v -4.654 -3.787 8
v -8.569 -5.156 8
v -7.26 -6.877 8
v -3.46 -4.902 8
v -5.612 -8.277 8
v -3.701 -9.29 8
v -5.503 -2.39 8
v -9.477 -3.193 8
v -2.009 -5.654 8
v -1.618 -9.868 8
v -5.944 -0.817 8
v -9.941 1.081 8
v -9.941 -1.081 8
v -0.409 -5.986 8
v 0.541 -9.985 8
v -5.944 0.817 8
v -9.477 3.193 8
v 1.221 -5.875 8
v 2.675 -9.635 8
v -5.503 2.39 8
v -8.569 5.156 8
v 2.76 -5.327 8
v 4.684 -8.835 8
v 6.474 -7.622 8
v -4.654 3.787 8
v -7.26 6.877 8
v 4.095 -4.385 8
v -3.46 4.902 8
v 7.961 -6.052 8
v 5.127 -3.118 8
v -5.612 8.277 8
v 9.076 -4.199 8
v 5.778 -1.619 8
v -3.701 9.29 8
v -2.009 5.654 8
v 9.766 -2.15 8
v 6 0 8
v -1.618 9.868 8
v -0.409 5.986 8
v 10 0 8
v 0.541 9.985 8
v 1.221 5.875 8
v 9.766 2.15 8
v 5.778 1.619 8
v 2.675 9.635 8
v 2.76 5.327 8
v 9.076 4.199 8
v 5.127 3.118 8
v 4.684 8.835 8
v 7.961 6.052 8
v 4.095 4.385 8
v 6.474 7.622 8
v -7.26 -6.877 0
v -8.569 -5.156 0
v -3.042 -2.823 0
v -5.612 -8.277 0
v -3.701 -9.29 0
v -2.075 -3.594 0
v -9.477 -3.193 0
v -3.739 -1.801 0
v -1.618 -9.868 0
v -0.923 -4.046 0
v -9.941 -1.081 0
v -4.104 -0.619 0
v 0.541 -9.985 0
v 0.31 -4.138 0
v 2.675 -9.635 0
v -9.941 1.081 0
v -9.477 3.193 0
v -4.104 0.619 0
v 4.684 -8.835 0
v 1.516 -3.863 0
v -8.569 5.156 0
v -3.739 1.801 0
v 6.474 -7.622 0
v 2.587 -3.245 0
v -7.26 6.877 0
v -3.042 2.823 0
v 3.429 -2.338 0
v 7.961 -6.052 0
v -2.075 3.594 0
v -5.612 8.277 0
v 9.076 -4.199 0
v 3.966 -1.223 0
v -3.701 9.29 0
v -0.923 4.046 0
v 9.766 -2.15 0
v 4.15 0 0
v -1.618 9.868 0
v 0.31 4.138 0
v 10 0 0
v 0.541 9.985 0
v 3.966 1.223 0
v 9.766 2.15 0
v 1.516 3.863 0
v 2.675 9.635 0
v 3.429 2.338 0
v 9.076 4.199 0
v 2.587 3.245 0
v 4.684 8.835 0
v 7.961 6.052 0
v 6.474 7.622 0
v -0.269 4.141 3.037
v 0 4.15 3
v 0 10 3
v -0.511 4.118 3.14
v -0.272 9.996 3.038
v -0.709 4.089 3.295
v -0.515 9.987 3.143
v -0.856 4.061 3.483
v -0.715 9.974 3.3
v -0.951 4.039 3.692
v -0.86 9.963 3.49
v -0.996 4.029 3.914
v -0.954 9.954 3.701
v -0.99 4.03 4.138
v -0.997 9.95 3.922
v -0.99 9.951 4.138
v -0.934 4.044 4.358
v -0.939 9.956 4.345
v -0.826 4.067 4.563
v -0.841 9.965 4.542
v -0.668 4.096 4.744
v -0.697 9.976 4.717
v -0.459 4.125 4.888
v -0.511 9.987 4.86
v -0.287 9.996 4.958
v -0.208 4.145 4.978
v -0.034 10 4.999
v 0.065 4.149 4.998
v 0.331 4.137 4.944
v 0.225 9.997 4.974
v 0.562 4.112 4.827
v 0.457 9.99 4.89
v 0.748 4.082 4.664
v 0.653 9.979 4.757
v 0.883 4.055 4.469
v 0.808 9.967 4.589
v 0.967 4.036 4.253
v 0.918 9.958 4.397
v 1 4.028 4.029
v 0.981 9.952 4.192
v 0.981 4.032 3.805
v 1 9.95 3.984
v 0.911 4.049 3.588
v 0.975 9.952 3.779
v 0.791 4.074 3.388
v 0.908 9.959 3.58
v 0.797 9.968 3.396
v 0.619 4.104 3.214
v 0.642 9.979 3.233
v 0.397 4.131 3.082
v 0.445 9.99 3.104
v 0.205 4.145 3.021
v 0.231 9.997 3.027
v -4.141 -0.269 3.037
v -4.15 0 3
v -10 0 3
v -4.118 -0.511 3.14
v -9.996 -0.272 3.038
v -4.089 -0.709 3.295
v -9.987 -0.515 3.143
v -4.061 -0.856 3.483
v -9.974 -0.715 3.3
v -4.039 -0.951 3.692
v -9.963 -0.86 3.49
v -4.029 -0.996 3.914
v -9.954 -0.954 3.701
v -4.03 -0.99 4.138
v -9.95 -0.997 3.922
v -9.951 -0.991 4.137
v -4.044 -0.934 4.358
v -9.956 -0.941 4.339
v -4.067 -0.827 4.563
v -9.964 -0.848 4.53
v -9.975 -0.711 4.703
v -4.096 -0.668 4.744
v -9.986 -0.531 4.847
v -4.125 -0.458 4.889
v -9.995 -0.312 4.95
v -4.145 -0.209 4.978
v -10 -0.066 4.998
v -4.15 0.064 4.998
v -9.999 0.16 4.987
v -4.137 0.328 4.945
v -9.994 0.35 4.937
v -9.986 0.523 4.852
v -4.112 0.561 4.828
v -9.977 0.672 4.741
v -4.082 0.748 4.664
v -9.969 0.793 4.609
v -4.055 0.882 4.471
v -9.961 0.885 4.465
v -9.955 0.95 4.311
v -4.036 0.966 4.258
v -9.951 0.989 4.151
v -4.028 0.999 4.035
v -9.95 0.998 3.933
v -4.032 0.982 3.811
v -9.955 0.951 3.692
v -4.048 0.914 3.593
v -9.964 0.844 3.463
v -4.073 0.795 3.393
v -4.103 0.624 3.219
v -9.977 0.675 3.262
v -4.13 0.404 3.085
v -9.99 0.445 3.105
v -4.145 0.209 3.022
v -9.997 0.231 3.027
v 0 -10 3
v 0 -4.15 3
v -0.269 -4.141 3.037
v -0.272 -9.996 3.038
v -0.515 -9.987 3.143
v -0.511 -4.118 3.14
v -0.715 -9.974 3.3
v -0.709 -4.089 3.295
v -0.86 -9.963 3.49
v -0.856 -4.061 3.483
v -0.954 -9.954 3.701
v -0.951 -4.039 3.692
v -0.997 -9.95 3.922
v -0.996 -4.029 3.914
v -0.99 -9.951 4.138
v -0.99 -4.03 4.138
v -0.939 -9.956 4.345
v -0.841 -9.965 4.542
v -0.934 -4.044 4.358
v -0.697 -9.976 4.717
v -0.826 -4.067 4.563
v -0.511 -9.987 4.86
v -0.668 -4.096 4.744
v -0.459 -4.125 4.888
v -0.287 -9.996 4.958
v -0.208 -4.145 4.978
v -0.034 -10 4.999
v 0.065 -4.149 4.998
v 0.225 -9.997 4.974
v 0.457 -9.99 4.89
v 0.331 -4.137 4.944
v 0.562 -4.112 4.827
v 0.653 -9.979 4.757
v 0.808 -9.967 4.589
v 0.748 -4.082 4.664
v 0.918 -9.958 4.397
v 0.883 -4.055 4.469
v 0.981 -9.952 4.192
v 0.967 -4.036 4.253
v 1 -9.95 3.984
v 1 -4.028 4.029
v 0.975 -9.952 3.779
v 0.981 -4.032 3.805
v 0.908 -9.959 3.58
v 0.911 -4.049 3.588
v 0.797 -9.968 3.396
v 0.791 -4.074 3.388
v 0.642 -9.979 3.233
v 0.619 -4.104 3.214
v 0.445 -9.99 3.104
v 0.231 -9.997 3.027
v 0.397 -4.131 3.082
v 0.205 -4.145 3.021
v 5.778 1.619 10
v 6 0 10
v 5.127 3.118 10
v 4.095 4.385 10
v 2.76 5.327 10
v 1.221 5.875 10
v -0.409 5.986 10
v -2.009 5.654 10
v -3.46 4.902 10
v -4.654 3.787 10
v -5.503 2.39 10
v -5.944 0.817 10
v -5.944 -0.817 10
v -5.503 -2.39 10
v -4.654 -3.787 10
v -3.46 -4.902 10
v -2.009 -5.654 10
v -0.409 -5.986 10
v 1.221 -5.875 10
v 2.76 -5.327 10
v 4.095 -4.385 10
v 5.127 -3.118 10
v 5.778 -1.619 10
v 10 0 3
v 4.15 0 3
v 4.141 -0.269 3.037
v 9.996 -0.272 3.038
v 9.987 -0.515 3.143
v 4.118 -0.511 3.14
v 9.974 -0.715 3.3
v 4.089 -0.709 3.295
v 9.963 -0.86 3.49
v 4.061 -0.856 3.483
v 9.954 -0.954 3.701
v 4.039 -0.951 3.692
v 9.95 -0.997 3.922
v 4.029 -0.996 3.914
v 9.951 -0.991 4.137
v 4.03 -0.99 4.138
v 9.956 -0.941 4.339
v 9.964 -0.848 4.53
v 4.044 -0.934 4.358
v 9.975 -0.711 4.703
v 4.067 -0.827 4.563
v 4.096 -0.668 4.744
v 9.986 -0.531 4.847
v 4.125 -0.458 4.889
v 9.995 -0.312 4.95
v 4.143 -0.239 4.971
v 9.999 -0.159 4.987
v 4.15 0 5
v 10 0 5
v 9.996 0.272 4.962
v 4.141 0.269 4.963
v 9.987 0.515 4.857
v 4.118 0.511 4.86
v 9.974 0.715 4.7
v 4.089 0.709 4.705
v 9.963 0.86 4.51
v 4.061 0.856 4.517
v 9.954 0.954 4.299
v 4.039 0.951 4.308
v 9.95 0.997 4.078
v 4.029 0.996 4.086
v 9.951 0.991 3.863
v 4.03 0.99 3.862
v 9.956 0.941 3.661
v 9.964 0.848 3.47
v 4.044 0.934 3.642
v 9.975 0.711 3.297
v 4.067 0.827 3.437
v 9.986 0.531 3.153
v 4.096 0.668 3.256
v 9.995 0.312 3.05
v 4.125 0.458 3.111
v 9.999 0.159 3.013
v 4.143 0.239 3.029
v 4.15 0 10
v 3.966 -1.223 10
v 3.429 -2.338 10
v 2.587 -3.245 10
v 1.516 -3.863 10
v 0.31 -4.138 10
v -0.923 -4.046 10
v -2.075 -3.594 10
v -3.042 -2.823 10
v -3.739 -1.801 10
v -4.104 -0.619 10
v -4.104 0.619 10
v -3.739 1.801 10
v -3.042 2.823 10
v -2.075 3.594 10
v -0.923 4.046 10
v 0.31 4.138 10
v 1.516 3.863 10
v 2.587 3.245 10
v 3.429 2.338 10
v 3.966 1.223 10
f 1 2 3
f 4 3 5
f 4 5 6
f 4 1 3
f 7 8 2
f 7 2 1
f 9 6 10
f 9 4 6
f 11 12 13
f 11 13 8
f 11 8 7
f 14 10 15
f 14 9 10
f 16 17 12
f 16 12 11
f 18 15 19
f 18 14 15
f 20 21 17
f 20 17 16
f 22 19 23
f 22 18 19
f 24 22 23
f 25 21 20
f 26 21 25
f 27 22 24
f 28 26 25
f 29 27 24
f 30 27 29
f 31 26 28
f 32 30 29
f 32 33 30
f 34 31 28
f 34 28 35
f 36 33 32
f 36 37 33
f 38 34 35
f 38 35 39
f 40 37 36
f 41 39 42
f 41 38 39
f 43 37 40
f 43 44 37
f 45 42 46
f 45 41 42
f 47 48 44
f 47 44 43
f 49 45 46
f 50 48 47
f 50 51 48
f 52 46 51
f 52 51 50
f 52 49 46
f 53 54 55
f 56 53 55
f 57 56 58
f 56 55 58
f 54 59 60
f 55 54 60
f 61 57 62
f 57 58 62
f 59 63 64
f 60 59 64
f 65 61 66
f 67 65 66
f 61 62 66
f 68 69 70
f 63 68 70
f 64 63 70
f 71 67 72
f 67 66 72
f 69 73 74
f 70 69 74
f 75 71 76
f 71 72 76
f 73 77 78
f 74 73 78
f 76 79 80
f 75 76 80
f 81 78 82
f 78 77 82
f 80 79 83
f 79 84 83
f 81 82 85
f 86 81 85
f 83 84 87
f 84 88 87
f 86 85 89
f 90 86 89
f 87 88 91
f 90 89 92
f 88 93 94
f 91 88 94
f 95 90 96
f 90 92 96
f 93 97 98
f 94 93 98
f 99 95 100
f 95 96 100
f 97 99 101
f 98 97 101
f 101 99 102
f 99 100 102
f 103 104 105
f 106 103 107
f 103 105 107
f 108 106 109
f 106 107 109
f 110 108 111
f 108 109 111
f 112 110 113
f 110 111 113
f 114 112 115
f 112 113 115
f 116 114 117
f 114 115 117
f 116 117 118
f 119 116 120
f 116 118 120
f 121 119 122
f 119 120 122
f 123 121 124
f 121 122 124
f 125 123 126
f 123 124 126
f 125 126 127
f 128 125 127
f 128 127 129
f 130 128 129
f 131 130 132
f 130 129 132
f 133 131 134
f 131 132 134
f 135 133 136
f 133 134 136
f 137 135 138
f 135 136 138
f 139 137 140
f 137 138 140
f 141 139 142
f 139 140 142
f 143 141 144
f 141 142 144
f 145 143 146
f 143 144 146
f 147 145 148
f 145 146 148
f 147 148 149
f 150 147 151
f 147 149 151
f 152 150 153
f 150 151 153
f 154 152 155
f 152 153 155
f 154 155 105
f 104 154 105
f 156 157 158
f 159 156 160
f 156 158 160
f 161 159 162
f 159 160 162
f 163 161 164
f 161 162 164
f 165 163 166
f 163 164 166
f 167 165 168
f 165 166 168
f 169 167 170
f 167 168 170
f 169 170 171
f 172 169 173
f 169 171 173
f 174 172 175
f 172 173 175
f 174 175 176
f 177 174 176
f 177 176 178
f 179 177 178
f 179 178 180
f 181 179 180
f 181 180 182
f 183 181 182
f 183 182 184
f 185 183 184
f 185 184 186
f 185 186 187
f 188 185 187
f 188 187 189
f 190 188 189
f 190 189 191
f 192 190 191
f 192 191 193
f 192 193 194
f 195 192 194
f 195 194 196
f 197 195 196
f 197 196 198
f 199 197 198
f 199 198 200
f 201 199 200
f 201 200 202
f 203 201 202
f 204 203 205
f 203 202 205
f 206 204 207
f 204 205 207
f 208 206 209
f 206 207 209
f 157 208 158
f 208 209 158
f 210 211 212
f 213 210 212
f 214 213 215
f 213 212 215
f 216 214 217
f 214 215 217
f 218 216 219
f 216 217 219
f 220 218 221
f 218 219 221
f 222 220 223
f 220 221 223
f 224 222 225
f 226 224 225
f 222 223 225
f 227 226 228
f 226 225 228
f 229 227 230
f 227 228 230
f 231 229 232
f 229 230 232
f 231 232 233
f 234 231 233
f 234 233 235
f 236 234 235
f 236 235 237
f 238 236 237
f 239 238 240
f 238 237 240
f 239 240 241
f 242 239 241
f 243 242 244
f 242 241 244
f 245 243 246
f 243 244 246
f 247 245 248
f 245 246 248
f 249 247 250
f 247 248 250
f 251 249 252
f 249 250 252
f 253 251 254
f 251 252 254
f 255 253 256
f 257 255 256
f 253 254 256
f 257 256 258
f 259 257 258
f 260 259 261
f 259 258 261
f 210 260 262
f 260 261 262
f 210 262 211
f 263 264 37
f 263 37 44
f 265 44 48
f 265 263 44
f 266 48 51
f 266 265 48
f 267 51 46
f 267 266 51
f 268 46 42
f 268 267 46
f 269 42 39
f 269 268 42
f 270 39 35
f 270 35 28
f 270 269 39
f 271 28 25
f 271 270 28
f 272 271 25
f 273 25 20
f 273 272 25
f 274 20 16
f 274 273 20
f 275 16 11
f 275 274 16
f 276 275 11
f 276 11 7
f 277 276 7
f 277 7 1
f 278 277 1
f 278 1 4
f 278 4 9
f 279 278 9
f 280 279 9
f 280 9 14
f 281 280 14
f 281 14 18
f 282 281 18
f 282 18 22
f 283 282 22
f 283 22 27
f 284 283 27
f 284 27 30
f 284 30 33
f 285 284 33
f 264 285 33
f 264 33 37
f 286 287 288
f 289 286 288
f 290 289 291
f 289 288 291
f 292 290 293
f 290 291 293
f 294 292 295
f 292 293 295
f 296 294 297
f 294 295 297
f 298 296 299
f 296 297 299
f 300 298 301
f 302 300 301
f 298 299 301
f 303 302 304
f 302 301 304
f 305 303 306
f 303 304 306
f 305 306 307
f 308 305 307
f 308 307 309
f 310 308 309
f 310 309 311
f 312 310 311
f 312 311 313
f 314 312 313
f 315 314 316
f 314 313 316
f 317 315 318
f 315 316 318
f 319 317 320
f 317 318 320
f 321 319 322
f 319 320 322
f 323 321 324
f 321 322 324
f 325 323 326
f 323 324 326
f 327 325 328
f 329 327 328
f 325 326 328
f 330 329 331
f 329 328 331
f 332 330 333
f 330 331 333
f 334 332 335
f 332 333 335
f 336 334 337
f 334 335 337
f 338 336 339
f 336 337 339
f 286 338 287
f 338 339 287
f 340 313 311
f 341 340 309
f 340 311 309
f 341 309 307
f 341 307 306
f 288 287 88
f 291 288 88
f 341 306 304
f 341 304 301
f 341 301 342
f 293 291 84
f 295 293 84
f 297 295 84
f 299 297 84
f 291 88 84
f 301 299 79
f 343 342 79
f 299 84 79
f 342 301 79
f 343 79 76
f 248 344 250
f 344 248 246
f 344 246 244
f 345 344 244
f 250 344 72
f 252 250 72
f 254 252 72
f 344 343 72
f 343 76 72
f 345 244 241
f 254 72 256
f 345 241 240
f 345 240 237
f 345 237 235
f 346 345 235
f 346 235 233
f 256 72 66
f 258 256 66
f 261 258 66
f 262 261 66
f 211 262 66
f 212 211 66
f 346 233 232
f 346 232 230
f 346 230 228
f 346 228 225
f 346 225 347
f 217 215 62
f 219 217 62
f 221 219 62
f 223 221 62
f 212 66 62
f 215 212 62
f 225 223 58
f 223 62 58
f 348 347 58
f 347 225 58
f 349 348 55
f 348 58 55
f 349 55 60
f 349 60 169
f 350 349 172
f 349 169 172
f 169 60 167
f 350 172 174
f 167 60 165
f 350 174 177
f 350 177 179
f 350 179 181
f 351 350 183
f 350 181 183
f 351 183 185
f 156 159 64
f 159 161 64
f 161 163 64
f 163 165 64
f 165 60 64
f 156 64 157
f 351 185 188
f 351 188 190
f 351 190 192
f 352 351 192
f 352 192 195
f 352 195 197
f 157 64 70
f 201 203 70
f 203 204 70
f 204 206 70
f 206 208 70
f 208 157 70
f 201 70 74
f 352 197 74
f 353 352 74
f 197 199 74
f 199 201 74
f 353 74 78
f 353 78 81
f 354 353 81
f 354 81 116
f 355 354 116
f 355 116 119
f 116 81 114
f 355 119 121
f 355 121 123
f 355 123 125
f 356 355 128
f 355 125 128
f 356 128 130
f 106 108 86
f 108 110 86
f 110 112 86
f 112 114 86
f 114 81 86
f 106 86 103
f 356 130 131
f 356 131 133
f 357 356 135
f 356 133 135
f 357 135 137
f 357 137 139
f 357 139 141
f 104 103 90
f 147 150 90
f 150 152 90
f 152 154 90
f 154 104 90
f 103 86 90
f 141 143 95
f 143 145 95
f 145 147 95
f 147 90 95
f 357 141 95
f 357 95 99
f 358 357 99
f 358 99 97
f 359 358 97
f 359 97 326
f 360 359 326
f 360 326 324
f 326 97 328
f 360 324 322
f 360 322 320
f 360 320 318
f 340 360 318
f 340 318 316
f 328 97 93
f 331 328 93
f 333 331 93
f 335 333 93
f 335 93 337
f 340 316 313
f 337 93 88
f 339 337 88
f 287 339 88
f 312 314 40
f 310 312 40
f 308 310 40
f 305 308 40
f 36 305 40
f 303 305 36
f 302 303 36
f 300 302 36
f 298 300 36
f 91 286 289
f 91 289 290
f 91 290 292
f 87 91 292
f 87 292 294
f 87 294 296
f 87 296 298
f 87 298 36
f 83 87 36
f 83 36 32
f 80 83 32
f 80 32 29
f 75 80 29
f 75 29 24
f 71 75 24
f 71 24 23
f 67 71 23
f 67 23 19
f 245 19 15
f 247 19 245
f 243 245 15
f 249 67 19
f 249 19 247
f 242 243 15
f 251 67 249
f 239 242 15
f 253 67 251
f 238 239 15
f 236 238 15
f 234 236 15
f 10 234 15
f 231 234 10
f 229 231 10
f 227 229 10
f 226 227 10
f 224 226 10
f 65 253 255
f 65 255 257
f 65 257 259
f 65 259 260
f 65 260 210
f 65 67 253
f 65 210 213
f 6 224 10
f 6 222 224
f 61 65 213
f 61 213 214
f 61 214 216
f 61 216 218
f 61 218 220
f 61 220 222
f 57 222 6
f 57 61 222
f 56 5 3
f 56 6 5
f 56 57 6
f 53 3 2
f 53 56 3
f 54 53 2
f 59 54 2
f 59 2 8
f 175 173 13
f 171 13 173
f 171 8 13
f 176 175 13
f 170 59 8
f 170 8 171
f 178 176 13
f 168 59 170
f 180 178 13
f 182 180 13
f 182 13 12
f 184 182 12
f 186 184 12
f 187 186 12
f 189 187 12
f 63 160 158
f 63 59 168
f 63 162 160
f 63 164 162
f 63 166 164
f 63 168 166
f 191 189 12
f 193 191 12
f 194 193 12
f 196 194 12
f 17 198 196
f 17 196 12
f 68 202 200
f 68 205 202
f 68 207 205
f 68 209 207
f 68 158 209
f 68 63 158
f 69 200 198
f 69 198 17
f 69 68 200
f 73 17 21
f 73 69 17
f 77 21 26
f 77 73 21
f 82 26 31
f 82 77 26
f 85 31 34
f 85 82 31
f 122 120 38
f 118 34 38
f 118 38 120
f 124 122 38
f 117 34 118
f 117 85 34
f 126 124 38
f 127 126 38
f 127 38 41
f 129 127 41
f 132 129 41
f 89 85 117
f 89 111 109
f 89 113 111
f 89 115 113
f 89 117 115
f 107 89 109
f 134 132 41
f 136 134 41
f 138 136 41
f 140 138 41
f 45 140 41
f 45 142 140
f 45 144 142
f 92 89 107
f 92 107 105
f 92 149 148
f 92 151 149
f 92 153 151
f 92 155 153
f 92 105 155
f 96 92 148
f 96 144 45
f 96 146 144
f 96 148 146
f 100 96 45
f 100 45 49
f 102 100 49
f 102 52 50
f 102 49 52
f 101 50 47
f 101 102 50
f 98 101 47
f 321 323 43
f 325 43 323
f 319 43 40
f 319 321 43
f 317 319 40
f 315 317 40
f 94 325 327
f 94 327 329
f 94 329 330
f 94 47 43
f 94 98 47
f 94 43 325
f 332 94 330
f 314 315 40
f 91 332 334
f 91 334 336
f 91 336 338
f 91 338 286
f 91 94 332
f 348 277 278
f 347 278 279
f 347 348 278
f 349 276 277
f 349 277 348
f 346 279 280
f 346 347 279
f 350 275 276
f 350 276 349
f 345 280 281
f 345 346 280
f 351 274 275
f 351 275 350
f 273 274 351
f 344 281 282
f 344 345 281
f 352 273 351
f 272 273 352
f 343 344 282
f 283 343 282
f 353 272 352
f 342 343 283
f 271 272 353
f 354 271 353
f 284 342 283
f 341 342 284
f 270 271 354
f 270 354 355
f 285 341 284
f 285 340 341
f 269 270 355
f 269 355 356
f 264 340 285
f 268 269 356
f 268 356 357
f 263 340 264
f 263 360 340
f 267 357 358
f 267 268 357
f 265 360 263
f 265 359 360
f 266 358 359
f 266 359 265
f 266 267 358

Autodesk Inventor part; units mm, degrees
ref_plane "YZ Plane" through (0, 0, 0) normal (1, 0, 0) x (0, 1, 0)
ref_plane "XZ Plane" through (0, 0, 0) normal (0, 1, 0) x (-1, 0, 0)
ref_plane "XY Plane" through (0, 0, 0) normal (0, 0, 1) x (1, 0, 0)
sketch "Sketch1" plane through (0, 0, 0) normal (0, 0, 1) x (1, 0, 0)
  circle A0 centre (0, 0) radius 4.15
  circle A1 centre (0, 0) radius 10
  dimension "d0" = 8.3
  dimension "d1" = 20
extrude "Extrusion1" add sketch "Sketch1" along normal blind 10
sketch "Sketch2" plane through (0, 0, 0) normal (1, 0, 0) x (0, 1, 0)
  line L0 (10, 0) -> (10, 10) projected
  line L1 (10, 0) -> (-10, 0) projected
  point P0 (0, 0)
  point P1 (0, 4)
  dimension "d22" = 4
hole "Hole1" at (0, 0, 4) direction (-1, 0, 0) diameter 2 end through all both
sketch "Sketch3" plane through (0, 0, 0) normal (0, 1, 0) x (-1, 0, 0)
  line L0 (10, 0) -> (-10, 0) projected
  point P0 (0, 0)
  point P1 (0, 4)
  dimension "d11" = 4
hole "Hole2" at (0, 0, 4) direction (0, 1, 0) diameter 2 end through all both
sketch "Sketch4" plane through (0, 0, 10) normal (0, 0, 1) x (1, 0, 0)
  circle A0 centre (0, 0) radius 10 projected
  circle A1 centre (0, 0) radius 4.15 projected
  circle A2 centre (0, 0) radius 6
  dimension "d21" = 12
extrude "Extrusion2" cut sketch "Sketch4" against normal blind 2 contours A0
properties part number "0008-30-008"
